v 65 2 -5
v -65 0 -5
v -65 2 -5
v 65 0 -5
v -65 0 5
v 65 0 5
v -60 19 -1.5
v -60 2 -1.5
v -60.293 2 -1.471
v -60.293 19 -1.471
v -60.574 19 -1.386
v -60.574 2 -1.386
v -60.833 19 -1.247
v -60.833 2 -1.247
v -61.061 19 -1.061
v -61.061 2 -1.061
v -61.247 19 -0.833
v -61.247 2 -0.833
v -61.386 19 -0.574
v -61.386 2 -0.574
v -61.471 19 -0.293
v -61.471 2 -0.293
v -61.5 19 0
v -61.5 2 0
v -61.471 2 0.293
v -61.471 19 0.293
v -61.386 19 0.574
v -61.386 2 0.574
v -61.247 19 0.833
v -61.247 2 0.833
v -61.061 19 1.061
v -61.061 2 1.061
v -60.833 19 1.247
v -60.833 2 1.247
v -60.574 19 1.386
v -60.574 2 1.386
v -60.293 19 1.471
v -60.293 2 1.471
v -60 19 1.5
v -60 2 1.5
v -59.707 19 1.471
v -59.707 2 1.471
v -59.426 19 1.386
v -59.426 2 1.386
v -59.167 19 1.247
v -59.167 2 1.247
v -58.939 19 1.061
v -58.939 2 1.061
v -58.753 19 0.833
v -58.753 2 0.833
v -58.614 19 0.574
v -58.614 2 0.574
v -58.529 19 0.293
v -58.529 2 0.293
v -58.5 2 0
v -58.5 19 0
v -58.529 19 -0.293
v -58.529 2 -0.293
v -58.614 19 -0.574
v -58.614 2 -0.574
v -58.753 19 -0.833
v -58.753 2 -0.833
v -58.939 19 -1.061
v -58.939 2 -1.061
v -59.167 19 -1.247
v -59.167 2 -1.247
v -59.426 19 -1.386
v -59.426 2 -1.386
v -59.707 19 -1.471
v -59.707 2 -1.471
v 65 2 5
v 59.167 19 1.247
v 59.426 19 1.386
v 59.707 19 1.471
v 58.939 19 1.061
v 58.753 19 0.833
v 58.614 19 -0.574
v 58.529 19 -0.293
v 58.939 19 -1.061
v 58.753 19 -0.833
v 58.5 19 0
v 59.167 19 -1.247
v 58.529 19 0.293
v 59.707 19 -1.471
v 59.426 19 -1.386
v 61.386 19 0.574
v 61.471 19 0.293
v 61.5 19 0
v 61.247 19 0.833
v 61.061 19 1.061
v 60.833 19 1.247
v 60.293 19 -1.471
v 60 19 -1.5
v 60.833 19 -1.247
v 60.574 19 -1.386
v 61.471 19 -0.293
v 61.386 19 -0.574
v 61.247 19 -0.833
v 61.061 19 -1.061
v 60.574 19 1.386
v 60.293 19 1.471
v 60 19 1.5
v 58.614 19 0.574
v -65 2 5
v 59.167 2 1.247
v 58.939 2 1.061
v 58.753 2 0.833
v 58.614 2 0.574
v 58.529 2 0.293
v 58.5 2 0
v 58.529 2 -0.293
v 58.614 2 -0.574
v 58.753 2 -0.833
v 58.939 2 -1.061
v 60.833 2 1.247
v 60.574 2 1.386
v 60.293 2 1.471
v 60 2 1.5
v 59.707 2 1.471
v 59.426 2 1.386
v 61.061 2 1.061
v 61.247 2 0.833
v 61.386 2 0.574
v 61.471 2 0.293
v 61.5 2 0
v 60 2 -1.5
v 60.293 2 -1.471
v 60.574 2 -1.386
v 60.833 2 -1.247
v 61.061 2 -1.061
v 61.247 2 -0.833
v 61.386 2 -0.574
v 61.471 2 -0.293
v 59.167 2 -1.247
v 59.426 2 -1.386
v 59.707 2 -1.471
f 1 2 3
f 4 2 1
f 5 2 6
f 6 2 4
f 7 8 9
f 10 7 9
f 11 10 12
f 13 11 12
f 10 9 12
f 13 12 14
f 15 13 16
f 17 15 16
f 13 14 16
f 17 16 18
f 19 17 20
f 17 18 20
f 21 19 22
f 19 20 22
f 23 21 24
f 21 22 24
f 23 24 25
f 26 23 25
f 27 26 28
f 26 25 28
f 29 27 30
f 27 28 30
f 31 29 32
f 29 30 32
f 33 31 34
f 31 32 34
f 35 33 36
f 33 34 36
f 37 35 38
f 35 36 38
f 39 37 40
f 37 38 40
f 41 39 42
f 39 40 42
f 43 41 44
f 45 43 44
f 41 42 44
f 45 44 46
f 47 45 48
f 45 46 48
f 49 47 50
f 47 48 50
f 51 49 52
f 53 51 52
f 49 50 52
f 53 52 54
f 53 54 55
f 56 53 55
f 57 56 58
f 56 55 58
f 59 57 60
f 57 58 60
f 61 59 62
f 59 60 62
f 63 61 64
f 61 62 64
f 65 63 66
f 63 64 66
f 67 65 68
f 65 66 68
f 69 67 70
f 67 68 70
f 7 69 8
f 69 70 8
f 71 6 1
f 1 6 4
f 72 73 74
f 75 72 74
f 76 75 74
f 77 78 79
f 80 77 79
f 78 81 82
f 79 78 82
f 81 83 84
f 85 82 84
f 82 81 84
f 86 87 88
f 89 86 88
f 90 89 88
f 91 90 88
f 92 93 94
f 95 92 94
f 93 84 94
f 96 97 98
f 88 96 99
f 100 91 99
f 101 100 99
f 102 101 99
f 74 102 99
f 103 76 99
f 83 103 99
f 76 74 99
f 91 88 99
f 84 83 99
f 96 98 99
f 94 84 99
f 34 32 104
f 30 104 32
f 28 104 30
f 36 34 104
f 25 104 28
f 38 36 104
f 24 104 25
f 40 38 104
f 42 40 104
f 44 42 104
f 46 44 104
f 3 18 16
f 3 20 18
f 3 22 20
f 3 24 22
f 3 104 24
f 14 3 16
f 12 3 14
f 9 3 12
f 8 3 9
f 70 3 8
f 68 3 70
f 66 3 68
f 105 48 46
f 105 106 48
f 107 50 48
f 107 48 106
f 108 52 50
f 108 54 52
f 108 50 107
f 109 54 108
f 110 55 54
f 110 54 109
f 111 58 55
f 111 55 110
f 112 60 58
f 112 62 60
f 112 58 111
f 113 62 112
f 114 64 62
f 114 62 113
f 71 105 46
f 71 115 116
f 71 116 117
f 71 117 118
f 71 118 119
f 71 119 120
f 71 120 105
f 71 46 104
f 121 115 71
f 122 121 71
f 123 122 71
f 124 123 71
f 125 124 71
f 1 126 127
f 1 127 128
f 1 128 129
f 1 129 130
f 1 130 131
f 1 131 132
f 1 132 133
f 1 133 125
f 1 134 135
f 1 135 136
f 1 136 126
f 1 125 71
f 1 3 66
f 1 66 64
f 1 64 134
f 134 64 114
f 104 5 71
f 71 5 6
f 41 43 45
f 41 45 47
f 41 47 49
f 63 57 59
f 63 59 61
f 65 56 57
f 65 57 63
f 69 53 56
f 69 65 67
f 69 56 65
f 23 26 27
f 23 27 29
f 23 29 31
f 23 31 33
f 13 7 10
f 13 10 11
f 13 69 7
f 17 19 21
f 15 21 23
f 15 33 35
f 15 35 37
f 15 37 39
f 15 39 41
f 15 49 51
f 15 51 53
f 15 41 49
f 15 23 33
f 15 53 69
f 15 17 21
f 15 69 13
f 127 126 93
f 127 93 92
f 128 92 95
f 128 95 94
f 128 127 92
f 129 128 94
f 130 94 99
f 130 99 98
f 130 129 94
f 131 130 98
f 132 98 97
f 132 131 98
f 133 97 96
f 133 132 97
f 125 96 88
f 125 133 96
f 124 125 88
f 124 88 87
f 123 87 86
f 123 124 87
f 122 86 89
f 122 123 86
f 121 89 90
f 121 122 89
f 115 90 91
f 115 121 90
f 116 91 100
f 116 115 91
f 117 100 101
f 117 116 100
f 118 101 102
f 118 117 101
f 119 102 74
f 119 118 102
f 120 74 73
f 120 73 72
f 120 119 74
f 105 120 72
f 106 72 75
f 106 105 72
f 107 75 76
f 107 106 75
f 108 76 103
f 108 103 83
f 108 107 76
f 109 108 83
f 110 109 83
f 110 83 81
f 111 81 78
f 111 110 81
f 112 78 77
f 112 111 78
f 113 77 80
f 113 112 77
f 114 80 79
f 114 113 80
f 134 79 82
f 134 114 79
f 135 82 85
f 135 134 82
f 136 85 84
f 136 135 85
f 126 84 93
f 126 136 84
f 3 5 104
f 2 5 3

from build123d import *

# Parameters (mm, degrees)
SKETCH3_W           = 130
SKETCH3_H           = 10
BOSS_EXTRUDE1_DEPTH = 2
SKETCH4_R           = 1.5
BOSS_EXTRUDE2_DEPTH = 17


with BuildPart() as part:
    # Sketch3 → Boss-Extrude1 (new body)
    with BuildSketch(Plane(origin=(0, 0, 0), x_dir=(1, 0, 0), z_dir=(0, 1, 0))):
        Rectangle(SKETCH3_W, SKETCH3_H)
    extrude(amount=BOSS_EXTRUDE1_DEPTH)

    # Sketch4 → Boss-Extrude2 (add)
    with BuildSketch(Plane(origin=(0, 2, 0), x_dir=(1, 0, 0), z_dir=(0, 1, 0))):
        with Locations(Location((-60, 0, 0), (0, 0, 90))):
            Circle(SKETCH4_R)
    boss_extrude2 = extrude(amount=BOSS_EXTRUDE2_DEPTH)

    # Mirror1: Boss-Extrude2 across plane
    add(boss_extrude2.mirror(Plane.ZY))


solid = part.part
